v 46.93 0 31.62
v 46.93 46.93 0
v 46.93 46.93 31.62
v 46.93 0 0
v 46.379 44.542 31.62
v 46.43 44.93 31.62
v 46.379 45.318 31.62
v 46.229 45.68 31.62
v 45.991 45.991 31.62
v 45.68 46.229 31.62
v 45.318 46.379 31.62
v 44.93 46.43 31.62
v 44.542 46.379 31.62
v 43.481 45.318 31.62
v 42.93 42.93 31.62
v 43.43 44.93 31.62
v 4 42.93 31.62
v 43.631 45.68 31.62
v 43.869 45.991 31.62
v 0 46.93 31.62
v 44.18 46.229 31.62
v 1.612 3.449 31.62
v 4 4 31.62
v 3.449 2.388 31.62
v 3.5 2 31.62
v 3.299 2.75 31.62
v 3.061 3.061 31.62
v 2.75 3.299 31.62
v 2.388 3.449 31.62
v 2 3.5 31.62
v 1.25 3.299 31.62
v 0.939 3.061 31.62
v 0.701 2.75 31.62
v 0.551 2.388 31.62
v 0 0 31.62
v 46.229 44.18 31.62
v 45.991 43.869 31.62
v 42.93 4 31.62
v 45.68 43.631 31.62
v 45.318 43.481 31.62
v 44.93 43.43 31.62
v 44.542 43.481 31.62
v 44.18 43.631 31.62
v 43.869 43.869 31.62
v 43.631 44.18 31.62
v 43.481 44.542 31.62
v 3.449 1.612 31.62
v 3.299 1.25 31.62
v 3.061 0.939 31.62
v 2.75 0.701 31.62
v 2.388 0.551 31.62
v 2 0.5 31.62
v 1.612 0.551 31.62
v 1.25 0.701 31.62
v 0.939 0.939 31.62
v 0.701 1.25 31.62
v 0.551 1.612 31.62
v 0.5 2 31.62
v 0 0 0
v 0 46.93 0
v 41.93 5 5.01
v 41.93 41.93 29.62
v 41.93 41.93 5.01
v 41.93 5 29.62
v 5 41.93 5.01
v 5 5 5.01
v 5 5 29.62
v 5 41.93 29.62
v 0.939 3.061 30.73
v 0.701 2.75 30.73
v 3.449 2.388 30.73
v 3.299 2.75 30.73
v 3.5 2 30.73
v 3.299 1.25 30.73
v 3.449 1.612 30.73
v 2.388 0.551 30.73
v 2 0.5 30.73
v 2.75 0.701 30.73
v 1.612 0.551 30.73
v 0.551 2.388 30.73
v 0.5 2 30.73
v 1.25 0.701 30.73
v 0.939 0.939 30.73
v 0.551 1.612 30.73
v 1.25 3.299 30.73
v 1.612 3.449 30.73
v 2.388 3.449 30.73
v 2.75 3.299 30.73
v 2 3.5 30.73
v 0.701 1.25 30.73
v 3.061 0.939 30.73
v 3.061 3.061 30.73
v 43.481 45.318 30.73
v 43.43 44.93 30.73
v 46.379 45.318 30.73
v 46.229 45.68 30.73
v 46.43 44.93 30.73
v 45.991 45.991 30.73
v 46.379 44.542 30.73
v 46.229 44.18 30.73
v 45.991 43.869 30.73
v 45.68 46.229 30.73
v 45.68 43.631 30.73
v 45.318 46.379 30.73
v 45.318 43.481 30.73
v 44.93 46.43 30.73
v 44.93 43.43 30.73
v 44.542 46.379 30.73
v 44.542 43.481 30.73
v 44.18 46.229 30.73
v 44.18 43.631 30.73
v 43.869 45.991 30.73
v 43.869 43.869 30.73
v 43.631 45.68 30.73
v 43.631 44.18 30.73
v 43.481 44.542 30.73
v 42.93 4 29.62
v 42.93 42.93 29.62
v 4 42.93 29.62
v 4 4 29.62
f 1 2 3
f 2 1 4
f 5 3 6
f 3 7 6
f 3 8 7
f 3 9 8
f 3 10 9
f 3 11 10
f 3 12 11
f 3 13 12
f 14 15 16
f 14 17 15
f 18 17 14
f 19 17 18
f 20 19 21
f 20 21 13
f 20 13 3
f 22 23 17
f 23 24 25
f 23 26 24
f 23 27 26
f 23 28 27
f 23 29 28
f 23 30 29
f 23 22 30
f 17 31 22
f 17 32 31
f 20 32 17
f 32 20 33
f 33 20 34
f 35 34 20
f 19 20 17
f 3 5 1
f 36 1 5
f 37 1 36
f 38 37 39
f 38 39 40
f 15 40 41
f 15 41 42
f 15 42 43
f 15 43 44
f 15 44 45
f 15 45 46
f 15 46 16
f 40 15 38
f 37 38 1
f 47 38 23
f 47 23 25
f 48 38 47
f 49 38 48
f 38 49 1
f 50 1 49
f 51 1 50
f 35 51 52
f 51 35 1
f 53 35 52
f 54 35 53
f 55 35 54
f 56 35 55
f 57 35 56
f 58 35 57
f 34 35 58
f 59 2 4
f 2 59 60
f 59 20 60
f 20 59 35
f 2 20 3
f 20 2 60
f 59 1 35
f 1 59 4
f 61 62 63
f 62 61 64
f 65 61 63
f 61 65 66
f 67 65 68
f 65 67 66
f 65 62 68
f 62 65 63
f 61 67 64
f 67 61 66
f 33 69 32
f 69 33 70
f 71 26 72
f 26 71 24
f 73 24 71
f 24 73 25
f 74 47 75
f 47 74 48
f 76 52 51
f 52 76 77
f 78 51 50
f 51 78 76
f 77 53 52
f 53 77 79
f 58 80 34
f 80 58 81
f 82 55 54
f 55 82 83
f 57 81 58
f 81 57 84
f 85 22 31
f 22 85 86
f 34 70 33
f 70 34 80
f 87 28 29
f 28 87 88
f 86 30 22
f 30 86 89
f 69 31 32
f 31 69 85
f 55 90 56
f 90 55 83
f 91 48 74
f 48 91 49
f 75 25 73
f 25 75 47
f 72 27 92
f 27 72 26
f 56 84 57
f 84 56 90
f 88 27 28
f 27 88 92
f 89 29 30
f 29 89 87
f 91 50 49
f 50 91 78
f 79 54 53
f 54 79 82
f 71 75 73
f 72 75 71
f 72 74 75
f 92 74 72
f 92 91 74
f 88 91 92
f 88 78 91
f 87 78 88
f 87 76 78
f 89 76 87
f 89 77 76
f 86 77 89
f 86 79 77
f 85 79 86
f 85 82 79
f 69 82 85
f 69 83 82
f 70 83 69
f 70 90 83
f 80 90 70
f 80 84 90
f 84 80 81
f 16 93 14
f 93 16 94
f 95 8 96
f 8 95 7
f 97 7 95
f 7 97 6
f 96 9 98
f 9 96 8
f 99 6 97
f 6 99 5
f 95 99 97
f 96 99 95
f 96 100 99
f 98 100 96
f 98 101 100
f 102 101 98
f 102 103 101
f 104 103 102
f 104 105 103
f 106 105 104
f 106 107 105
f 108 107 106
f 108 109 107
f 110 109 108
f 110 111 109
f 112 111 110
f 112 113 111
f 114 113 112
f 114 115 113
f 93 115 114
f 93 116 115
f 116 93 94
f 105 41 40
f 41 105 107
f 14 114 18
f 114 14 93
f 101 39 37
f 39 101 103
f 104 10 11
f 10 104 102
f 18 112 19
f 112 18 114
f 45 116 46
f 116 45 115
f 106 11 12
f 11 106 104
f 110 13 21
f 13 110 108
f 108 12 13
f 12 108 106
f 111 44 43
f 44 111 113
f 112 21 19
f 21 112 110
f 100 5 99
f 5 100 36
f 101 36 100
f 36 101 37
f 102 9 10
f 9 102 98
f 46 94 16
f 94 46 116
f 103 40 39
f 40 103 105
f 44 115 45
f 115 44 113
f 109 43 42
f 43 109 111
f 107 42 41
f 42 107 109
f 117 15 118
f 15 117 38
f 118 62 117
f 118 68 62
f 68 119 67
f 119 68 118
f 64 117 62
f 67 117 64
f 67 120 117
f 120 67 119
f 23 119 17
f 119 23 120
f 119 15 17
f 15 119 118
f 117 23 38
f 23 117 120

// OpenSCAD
// Dice measures: 12.3mm x 12.3mm x 12.3mm
$fa = 1;
$fs = 0.4;

hole_with = 12.31*3;
hole_lenght = 12.31*3;
hole_hight = 12.31*2;

magnet_radius = 1.5;
magnet_lenght = 0.9;

// Dice box
difference() {
    cube([hole_with + 10, hole_lenght + 10, hole_hight + 7]);

    // Dice hole
    translate([5, 5, 5.01])
        cube([hole_with, hole_lenght, hole_hight]);

    // Maget Holes
    translate([magnet_radius + 0.5, magnet_radius + 0.5, hole_hight + 5 - magnet_lenght + 0.01 + 2])
        cylinder(r=magnet_radius, h=magnet_lenght);

    translate([hole_with + 10 - magnet_radius - 0.5, hole_with + 10 - magnet_radius - 0.5, hole_hight + 5 - magnet_lenght + 0.01 + 2])
        cylinder(r=magnet_radius, h=magnet_lenght);

    // Cover hole
    translate([4, 4, hole_hight + 5])
        cube([hole_with + 2, hole_lenght + 2, 2.01]);
    
}
